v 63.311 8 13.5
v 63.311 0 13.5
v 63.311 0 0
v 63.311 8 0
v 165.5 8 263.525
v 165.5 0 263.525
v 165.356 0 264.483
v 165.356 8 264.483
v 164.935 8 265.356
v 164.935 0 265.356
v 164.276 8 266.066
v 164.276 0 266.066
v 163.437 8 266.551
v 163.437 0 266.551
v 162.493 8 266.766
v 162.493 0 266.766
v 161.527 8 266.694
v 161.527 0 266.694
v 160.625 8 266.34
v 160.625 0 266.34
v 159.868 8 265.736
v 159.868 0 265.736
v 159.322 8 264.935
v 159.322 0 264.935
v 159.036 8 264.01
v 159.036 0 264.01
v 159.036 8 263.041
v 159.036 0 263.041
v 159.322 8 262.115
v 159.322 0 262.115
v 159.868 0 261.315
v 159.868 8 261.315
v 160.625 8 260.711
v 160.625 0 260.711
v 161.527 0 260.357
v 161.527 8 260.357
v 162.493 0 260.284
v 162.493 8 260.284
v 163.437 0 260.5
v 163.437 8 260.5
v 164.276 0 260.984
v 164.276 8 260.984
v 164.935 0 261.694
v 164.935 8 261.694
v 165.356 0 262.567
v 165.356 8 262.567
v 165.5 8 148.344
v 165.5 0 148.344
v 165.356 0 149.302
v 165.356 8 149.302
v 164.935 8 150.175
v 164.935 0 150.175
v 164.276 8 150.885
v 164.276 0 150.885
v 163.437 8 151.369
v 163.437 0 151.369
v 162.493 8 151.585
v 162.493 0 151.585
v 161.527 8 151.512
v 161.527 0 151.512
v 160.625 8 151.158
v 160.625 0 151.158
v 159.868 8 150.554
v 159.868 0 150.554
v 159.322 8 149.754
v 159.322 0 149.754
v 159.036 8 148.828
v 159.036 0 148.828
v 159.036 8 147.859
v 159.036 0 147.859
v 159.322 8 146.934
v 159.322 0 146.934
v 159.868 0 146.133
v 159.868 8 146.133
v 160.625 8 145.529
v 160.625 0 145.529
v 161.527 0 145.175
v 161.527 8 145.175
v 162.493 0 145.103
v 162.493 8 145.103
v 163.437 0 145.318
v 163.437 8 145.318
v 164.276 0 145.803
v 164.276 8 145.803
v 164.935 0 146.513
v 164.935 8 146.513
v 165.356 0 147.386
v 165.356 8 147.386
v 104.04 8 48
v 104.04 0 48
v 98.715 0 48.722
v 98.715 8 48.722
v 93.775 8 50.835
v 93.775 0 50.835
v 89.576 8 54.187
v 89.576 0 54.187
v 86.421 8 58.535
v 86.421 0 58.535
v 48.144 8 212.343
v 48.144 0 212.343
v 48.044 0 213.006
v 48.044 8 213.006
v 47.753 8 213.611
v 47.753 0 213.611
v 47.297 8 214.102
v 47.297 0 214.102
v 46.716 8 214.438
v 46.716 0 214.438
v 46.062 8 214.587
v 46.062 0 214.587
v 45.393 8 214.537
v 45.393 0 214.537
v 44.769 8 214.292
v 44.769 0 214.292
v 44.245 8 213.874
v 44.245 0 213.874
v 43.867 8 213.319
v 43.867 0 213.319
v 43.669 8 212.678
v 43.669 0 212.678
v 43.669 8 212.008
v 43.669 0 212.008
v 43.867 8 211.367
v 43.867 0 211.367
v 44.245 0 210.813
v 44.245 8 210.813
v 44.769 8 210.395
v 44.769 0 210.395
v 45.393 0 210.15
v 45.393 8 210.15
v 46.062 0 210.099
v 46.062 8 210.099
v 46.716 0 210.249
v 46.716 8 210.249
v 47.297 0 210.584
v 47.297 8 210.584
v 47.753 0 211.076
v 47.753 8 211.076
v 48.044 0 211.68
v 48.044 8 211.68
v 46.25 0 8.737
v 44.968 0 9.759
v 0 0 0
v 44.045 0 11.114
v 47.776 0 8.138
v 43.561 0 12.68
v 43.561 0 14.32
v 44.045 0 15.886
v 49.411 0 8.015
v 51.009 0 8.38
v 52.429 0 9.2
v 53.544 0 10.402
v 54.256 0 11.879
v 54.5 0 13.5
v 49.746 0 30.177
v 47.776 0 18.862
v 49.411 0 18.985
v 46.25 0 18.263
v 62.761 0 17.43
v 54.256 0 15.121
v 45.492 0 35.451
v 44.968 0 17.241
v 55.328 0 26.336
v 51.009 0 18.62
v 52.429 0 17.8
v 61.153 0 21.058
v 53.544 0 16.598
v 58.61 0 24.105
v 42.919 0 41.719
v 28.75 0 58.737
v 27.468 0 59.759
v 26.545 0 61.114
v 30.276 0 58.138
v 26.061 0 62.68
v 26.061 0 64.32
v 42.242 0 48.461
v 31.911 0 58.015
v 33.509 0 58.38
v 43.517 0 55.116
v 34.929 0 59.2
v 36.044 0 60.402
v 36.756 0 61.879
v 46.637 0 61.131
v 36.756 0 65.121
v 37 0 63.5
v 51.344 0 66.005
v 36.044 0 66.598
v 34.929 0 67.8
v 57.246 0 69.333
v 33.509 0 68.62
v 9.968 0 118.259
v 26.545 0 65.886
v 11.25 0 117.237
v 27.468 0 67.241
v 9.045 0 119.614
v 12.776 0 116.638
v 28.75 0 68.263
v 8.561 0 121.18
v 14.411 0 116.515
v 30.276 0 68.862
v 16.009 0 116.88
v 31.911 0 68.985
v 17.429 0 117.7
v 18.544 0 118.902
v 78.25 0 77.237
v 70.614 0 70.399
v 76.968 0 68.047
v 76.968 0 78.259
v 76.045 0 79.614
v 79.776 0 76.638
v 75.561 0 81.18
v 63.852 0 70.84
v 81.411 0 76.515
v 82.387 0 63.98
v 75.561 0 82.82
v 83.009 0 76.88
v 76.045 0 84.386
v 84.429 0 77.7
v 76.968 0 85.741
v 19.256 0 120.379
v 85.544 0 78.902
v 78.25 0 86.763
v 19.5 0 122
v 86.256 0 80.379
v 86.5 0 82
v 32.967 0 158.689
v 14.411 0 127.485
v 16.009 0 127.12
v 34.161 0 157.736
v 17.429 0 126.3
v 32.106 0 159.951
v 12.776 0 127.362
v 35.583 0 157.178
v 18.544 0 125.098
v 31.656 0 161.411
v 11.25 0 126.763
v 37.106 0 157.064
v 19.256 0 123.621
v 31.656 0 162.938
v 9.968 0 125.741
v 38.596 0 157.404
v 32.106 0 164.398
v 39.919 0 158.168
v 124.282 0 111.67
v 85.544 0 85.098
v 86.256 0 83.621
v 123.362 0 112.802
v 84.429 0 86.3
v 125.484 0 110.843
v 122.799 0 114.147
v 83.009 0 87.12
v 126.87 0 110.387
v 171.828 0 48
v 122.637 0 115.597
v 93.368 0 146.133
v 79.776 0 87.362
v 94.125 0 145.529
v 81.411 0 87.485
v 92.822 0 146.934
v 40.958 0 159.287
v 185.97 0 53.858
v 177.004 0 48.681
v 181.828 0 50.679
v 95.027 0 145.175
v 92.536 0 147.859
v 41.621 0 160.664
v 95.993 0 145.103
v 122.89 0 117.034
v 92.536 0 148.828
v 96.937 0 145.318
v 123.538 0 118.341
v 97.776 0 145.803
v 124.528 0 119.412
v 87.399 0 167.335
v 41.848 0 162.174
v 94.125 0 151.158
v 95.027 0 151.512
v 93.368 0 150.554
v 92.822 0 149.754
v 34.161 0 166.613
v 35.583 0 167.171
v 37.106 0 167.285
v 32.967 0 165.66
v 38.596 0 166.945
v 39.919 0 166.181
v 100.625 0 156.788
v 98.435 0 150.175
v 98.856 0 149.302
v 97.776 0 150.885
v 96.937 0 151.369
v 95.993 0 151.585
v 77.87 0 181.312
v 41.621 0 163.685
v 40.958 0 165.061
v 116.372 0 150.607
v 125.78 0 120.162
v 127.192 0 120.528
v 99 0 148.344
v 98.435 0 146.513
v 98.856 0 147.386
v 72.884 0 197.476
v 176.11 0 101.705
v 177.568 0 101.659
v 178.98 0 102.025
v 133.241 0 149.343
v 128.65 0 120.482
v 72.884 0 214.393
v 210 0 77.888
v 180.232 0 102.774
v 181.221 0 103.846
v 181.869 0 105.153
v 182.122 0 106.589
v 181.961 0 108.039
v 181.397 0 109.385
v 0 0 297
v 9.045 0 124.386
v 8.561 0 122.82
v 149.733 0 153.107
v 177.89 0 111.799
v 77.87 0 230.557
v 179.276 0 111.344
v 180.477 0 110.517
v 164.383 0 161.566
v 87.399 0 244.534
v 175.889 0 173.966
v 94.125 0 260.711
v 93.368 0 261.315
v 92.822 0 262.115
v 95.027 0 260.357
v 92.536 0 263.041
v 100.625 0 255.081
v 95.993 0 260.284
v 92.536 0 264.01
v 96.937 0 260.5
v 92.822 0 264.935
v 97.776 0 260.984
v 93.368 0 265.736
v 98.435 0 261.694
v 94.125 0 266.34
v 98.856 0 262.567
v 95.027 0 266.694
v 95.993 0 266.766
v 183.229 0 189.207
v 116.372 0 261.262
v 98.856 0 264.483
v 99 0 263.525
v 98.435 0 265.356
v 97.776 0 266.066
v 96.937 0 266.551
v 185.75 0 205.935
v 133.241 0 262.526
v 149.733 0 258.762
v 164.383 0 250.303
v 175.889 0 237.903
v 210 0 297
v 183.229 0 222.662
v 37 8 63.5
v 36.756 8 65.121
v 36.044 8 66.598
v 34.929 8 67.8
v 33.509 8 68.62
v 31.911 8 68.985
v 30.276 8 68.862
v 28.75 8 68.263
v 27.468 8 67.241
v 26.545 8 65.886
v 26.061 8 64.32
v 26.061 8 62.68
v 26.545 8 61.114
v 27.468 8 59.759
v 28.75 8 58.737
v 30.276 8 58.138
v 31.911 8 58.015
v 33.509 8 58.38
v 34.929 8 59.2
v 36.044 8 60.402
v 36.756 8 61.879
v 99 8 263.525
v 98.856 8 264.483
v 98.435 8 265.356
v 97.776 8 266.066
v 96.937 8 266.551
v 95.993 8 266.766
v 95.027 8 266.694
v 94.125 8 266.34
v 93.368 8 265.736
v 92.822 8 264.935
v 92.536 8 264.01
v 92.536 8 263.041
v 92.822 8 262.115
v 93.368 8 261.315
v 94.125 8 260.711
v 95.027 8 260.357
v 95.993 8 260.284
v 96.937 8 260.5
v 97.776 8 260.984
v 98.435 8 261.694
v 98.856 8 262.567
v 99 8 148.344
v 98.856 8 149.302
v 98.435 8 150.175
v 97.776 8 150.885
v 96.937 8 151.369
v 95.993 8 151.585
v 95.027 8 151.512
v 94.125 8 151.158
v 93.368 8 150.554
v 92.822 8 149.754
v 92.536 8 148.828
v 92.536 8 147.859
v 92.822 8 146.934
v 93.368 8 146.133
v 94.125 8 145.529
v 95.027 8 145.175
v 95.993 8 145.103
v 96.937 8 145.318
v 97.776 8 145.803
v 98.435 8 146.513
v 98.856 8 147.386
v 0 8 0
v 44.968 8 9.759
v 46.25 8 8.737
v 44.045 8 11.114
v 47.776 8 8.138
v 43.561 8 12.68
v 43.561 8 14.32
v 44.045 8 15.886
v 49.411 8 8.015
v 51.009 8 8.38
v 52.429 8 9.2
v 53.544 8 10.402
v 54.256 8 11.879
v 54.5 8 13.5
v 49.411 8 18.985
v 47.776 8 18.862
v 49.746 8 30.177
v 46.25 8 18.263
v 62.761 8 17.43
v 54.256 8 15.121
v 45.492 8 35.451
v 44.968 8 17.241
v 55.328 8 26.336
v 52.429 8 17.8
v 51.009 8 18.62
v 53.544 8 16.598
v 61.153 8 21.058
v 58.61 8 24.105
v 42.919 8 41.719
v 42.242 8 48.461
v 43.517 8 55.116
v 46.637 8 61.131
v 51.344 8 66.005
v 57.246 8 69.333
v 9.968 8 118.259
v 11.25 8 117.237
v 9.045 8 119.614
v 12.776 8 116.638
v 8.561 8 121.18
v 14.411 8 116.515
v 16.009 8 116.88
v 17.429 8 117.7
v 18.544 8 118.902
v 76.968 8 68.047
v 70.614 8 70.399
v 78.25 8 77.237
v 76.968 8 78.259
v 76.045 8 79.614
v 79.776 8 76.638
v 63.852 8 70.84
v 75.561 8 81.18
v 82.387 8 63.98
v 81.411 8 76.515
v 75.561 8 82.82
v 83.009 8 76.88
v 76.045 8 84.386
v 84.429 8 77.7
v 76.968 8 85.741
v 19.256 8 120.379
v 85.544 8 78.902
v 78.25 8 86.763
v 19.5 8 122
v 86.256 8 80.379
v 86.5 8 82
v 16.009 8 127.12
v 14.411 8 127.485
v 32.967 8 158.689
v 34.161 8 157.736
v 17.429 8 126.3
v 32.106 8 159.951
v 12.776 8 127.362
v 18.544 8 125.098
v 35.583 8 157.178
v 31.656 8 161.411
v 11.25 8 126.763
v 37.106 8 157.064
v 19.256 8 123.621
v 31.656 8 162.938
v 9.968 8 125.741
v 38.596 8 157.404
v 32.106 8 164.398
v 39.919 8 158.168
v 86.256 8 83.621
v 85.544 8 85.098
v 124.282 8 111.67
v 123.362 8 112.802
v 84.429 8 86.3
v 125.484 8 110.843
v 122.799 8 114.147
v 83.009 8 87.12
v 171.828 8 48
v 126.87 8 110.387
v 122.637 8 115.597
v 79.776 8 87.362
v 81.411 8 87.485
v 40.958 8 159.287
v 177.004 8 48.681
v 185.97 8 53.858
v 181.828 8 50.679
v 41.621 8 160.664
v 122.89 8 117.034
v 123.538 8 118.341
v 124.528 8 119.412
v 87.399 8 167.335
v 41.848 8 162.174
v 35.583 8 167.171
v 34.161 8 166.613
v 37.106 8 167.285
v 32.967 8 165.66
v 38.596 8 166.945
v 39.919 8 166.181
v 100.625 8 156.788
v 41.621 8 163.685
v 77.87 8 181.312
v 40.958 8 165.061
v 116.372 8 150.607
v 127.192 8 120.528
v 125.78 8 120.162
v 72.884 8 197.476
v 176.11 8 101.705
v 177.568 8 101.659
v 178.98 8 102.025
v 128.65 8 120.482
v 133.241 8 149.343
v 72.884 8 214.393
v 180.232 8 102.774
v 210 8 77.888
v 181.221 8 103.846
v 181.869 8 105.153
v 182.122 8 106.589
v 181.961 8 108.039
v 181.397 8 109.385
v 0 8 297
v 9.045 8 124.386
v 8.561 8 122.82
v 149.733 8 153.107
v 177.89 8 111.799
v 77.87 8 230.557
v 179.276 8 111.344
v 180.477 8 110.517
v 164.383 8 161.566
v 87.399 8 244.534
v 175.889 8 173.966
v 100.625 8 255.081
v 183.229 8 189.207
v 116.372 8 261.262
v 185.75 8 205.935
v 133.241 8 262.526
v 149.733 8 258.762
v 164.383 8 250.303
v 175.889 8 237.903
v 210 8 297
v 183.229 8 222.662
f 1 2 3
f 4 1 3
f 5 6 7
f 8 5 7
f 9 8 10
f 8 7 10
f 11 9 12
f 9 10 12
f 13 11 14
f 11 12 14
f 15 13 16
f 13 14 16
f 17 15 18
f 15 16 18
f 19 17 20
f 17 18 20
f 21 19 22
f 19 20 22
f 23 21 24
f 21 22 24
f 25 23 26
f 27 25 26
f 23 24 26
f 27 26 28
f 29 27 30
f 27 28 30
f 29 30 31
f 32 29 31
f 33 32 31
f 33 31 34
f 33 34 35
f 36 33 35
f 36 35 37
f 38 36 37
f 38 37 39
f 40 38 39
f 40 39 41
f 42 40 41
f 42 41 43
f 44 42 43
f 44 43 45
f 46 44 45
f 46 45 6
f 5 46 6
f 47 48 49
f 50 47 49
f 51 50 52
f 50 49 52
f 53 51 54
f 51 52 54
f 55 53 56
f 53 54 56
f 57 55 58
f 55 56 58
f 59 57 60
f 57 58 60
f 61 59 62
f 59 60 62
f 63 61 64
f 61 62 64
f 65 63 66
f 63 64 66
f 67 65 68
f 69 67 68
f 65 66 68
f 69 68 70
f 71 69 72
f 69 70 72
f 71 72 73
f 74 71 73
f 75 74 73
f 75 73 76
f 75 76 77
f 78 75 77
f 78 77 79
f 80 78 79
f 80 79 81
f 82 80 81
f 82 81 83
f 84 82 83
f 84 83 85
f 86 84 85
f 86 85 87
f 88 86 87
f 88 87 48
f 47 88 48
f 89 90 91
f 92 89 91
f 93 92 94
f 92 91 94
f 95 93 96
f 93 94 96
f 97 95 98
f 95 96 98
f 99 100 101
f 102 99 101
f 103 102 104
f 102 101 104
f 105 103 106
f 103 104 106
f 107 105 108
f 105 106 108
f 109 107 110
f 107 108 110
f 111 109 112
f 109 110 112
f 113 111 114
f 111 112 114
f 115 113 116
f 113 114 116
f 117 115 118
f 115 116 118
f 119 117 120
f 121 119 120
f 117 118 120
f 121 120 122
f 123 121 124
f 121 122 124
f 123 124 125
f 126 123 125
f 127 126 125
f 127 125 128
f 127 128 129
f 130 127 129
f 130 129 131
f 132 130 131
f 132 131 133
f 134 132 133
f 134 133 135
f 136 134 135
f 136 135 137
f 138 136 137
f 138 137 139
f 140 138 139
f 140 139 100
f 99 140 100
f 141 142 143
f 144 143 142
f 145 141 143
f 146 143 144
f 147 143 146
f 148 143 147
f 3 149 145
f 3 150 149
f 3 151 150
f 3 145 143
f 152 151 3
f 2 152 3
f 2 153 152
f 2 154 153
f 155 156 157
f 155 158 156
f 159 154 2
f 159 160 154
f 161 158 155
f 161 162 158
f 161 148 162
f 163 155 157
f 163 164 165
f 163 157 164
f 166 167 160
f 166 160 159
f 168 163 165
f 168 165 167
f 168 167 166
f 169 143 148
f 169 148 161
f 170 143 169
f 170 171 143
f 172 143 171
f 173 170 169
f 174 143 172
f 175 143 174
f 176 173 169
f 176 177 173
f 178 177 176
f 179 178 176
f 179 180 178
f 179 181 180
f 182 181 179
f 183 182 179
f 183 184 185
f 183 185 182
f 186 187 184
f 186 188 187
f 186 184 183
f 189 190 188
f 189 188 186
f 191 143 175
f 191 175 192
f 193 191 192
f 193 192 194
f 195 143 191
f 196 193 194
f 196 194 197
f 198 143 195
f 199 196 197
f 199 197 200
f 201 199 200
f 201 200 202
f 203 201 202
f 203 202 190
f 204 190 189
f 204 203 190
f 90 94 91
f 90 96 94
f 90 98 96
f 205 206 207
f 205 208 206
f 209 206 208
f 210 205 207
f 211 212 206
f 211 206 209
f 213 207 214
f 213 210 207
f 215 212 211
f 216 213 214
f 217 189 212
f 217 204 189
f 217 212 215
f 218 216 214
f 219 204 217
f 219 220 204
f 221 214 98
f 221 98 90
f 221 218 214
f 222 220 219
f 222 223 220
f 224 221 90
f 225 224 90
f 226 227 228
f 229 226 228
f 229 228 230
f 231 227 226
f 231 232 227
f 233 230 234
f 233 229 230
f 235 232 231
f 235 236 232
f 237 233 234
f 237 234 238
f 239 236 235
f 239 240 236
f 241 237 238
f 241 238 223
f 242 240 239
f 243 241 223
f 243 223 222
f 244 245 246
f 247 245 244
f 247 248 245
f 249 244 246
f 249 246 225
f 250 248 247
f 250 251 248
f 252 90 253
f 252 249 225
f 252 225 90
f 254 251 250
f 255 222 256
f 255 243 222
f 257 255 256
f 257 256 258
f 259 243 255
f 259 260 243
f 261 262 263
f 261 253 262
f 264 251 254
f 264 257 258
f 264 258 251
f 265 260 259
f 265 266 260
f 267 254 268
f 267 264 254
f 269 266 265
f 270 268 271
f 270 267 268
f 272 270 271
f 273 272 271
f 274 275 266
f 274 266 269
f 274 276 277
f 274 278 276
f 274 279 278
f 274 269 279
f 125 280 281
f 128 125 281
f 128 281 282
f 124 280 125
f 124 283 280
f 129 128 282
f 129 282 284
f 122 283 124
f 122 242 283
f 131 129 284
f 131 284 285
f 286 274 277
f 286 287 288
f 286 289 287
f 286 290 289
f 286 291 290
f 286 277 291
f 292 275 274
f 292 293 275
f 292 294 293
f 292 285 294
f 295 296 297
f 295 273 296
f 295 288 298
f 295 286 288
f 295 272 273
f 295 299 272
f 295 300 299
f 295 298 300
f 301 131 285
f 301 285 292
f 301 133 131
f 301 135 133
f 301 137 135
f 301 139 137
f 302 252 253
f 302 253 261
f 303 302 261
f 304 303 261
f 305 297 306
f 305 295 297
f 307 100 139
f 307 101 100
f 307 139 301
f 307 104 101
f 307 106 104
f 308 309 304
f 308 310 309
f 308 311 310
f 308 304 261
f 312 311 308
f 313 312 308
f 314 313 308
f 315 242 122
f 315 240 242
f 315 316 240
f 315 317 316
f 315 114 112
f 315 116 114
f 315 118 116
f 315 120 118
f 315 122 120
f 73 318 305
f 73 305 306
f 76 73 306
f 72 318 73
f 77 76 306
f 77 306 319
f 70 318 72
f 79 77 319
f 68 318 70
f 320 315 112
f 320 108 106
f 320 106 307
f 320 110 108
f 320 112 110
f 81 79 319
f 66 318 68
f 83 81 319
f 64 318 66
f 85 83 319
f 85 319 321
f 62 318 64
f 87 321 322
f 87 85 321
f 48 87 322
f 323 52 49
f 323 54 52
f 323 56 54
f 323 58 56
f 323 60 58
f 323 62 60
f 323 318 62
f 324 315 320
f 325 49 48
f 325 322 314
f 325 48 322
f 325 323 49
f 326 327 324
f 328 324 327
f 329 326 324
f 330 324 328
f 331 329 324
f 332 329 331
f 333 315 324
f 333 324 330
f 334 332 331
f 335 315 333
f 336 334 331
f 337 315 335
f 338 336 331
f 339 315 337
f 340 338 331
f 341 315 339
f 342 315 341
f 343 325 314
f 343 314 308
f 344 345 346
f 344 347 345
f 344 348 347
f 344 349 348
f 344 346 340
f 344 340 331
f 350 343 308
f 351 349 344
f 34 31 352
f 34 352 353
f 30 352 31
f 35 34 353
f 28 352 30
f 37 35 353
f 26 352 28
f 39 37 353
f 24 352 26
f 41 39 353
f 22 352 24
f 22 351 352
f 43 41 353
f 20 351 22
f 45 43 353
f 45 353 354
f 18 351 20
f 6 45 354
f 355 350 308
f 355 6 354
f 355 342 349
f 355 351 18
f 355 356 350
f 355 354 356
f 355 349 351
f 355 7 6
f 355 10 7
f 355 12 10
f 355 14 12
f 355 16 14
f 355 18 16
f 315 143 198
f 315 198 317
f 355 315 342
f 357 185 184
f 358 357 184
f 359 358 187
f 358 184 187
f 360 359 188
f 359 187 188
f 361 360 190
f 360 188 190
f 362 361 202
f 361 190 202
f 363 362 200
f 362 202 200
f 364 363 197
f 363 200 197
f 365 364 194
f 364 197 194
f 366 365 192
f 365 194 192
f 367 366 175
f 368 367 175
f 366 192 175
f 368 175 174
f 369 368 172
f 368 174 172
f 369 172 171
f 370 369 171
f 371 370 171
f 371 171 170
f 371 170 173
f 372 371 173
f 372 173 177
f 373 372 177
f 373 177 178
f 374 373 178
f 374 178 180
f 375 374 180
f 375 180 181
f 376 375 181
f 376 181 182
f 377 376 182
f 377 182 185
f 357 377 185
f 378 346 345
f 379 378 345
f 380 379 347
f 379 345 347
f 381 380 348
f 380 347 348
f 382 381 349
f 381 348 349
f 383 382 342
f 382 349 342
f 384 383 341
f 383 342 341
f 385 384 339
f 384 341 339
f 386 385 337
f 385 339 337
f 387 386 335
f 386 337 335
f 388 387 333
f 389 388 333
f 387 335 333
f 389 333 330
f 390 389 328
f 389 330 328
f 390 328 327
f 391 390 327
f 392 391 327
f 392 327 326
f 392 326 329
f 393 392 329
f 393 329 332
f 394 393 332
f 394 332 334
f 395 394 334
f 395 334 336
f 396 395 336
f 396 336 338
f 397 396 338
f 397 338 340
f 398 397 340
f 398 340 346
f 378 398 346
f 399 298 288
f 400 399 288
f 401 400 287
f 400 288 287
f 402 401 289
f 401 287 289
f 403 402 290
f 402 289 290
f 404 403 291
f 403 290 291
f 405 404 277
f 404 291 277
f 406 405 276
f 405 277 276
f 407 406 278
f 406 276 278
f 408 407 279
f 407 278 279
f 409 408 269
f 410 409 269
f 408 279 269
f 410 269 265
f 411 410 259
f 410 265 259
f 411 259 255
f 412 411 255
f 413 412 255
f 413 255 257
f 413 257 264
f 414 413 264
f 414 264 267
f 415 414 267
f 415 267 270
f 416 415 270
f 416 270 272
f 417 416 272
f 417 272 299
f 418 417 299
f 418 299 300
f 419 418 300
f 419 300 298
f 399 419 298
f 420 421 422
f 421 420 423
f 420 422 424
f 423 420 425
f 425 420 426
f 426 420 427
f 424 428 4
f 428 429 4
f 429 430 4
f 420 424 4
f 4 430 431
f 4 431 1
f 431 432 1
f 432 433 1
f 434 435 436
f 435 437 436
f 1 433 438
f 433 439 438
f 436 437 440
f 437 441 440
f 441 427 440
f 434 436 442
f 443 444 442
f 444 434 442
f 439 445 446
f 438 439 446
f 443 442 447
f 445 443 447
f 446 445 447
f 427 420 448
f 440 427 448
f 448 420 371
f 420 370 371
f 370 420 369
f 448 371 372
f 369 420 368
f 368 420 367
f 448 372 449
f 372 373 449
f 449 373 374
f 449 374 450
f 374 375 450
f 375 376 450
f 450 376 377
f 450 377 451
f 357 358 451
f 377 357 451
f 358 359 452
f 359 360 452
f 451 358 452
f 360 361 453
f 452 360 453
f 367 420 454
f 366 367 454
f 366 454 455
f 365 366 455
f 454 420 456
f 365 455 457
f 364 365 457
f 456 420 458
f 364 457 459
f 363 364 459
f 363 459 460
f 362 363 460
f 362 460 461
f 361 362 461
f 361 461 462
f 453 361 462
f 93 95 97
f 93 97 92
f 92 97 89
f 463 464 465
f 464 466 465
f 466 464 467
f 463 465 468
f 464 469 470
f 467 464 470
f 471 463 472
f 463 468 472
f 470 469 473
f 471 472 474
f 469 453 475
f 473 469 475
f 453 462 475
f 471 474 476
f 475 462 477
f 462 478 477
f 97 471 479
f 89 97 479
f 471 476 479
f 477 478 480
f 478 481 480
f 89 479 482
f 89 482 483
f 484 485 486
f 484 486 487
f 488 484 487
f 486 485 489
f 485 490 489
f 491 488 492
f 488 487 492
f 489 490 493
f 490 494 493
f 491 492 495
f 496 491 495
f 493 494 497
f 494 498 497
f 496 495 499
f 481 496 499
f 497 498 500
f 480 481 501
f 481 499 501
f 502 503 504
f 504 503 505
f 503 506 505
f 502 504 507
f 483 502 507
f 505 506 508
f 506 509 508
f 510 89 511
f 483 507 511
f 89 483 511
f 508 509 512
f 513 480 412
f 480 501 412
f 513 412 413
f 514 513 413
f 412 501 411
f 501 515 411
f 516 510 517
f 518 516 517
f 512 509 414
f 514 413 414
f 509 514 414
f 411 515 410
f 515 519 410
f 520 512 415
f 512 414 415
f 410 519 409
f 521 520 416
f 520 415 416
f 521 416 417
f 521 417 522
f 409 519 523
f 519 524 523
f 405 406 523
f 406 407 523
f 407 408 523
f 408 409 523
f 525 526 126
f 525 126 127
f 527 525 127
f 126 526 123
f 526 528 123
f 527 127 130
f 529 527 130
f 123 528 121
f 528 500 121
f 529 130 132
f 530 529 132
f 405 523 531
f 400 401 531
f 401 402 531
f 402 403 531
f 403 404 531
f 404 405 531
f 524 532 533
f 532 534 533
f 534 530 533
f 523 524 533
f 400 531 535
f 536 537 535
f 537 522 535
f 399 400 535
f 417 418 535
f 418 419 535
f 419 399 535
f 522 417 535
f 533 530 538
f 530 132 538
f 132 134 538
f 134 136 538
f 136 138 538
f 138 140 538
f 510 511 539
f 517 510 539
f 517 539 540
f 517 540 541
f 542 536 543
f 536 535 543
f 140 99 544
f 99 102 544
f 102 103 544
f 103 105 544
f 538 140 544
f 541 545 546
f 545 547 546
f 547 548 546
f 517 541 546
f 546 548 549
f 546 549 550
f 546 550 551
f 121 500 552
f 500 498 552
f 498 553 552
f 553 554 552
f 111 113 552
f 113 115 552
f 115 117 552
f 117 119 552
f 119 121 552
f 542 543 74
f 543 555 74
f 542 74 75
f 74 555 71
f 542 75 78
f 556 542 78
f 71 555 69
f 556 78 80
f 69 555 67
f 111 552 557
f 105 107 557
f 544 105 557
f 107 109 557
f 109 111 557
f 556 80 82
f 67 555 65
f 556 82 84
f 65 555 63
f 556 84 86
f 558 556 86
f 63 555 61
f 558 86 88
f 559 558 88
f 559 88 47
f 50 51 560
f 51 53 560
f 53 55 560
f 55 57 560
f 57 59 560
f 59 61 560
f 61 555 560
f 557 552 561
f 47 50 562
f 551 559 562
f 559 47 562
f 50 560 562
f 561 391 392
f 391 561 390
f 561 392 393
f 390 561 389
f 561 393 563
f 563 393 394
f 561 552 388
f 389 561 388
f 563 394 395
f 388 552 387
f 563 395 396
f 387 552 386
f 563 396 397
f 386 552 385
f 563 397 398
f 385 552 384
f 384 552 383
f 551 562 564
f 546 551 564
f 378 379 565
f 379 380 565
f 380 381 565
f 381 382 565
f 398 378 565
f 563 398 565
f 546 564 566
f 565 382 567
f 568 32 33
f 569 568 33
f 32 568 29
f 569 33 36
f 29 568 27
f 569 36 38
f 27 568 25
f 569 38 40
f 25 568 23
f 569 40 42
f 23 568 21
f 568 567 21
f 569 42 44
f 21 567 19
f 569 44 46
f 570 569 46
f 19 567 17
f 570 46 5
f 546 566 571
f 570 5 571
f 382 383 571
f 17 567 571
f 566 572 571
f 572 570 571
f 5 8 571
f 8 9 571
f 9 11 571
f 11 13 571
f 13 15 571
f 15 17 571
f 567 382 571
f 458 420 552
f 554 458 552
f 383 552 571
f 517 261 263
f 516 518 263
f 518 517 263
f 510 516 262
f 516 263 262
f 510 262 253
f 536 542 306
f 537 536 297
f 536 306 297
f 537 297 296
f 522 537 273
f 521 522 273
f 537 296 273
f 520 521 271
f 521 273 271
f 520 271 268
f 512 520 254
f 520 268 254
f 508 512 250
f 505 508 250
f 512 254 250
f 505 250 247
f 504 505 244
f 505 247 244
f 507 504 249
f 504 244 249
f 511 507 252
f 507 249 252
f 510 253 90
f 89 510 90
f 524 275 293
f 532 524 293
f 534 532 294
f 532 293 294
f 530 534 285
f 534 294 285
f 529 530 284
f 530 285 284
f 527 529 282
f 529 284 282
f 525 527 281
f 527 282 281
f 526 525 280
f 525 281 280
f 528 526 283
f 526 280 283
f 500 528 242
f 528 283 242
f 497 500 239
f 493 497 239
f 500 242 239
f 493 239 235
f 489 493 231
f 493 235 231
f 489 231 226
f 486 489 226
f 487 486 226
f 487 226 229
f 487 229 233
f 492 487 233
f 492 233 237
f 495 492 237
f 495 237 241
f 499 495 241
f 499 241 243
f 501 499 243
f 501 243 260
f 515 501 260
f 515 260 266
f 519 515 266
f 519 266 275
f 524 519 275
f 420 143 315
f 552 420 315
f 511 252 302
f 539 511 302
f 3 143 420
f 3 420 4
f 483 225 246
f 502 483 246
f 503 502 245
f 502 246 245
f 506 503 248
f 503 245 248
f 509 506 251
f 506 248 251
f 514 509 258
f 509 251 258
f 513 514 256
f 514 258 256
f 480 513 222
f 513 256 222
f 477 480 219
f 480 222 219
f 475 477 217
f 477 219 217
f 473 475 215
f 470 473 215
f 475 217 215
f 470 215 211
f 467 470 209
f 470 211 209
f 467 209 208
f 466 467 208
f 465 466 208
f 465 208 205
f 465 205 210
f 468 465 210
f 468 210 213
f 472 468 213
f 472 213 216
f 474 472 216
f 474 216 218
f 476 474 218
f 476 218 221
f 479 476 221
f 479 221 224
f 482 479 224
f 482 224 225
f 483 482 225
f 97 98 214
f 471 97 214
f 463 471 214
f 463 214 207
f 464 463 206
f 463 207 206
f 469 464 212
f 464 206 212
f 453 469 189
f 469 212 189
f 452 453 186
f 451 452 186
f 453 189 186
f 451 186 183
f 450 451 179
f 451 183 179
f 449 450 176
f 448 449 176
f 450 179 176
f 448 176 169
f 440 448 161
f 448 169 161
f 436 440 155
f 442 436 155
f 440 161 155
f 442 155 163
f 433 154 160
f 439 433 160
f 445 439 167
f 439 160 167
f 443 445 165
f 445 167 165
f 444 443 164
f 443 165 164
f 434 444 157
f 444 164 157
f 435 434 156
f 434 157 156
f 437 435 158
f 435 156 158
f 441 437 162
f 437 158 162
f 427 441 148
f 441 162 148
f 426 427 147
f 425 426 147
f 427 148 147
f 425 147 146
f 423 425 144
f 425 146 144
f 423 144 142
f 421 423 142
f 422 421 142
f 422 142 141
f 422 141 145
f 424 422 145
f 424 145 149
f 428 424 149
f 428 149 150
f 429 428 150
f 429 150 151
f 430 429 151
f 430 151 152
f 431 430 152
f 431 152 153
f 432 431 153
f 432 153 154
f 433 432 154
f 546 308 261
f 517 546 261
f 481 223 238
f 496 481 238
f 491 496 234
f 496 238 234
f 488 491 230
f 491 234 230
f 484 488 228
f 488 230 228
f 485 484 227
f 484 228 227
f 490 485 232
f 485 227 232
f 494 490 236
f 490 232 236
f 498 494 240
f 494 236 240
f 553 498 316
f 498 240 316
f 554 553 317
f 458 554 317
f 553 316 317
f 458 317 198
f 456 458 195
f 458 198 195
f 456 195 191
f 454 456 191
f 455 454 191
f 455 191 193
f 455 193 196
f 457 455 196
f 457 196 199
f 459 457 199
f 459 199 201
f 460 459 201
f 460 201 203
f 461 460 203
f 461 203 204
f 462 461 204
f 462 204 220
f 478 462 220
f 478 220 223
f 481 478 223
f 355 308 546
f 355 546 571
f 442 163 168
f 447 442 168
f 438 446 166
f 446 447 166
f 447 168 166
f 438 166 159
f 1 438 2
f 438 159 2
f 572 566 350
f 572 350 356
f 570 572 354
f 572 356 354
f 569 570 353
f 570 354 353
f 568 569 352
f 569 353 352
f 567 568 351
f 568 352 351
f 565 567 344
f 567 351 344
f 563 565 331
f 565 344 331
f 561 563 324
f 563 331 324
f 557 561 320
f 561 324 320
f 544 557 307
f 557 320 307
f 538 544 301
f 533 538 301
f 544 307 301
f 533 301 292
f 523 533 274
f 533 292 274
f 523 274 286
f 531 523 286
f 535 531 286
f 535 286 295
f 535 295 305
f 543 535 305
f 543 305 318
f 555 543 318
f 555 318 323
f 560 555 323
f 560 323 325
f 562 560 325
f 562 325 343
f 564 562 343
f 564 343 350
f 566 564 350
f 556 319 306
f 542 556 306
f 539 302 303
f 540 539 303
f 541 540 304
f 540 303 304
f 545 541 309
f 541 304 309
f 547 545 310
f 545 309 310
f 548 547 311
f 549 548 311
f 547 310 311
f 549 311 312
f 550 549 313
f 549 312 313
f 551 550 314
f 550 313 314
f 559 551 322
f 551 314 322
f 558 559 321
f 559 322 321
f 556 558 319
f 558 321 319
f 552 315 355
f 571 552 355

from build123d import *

# Parameters (mm, degrees)
F0_W     = 210
F0_H     = 297
F1_DEPTH = 8
F2_R     = 5.5
F3_DEPTH = 8.001
F4_R     = 56.75
F4_R_2   = 3.25
F5_DEPTH = 8.001
F6_R     = 5.125
F6_R_2   = 2.25
F7_DEPTH = 8.001


with BuildPart() as f1:
    # F0 (on Front) → F1 (new body)
    with BuildSketch(Plane.XZ):
        with Locations((105, 148.5)):
            Rectangle(F0_W, F0_H)
    extrude(amount=-F1_DEPTH)

    # F2 (on face) → F3 (cut, through all)
    with BuildSketch(Plane.XZ):
        with Locations((14, 122)):
            Circle(F2_R)
        with Locations((31.5, 63.5)):
            Circle(F2_R)
        with Locations((81, 82)):
            Circle(F2_R)
        with Locations((49, 13.5)):
            Circle(F2_R)
        with BuildLine():
            ThreePointArc((104.039609, 48), (93.77548, 50.834696), (86.42092, 58.535235))
            ThreePointArc((86.42092, 58.535235), (48.814136, 63.738258), (55.327996, 26.336236))
            ThreePointArc((55.327996, 26.336236), (61.152657, 21.058135), (63.311271, 13.5))
            Line((63.311271, 13.5), (63.311271, 0))
            Line((63.311271, 0), (210, 0))
            Line((210, 0), (210, 77.888055))
            Line((210, 77.888055), (185.96981, 53.857864))
            ThreePointArc((185.96981, 53.857864), (179.481343, 49.522409), (171.827674, 48))
            Line((171.827674, 48), (104.039609, 48))
        make_face()
    extrude(amount=-F3_DEPTH, mode=Mode.SUBTRACT)

    # F4 (on face) → F5 (cut, through all)
    with BuildSketch(Plane.XZ):
        with Locations((129, 205.934511)):
            Circle(F4_R)
        with Locations((95.75, 263.5252)):
            Circle(F4_R_2)
        with Locations((162.25, 263.5252)):
            Circle(F4_R_2)
        with Locations((95.75, 148.343821)):
            Circle(F4_R_2)
        with Locations((162.25, 148.343821)):
            Circle(F4_R_2)
    extrude(amount=-F5_DEPTH, mode=Mode.SUBTRACT)

    # F6 (on face) → F7 (cut, through all)
    with BuildSketch(Plane.XZ):
        with BuildLine():
            Line((177.889947, 111.799242), (128.649559, 120.48165))
            ThreePointArc((128.649559, 120.48165), (122.712473, 116.324458), (126.869665, 110.387371))
            Line((126.869665, 110.387371), (176.110053, 101.704962))
            ThreePointArc((176.110053, 101.704962), (182.04714, 105.862155), (177.889947, 111.799242))
        make_face()
        with Locations((36.723409, 162.174419)):
            Circle(F6_R)
        with Locations((45.894034, 212.34313)):
            Circle(F6_R_2)
    extrude(amount=-F7_DEPTH, mode=Mode.SUBTRACT)


solid = f1.part
